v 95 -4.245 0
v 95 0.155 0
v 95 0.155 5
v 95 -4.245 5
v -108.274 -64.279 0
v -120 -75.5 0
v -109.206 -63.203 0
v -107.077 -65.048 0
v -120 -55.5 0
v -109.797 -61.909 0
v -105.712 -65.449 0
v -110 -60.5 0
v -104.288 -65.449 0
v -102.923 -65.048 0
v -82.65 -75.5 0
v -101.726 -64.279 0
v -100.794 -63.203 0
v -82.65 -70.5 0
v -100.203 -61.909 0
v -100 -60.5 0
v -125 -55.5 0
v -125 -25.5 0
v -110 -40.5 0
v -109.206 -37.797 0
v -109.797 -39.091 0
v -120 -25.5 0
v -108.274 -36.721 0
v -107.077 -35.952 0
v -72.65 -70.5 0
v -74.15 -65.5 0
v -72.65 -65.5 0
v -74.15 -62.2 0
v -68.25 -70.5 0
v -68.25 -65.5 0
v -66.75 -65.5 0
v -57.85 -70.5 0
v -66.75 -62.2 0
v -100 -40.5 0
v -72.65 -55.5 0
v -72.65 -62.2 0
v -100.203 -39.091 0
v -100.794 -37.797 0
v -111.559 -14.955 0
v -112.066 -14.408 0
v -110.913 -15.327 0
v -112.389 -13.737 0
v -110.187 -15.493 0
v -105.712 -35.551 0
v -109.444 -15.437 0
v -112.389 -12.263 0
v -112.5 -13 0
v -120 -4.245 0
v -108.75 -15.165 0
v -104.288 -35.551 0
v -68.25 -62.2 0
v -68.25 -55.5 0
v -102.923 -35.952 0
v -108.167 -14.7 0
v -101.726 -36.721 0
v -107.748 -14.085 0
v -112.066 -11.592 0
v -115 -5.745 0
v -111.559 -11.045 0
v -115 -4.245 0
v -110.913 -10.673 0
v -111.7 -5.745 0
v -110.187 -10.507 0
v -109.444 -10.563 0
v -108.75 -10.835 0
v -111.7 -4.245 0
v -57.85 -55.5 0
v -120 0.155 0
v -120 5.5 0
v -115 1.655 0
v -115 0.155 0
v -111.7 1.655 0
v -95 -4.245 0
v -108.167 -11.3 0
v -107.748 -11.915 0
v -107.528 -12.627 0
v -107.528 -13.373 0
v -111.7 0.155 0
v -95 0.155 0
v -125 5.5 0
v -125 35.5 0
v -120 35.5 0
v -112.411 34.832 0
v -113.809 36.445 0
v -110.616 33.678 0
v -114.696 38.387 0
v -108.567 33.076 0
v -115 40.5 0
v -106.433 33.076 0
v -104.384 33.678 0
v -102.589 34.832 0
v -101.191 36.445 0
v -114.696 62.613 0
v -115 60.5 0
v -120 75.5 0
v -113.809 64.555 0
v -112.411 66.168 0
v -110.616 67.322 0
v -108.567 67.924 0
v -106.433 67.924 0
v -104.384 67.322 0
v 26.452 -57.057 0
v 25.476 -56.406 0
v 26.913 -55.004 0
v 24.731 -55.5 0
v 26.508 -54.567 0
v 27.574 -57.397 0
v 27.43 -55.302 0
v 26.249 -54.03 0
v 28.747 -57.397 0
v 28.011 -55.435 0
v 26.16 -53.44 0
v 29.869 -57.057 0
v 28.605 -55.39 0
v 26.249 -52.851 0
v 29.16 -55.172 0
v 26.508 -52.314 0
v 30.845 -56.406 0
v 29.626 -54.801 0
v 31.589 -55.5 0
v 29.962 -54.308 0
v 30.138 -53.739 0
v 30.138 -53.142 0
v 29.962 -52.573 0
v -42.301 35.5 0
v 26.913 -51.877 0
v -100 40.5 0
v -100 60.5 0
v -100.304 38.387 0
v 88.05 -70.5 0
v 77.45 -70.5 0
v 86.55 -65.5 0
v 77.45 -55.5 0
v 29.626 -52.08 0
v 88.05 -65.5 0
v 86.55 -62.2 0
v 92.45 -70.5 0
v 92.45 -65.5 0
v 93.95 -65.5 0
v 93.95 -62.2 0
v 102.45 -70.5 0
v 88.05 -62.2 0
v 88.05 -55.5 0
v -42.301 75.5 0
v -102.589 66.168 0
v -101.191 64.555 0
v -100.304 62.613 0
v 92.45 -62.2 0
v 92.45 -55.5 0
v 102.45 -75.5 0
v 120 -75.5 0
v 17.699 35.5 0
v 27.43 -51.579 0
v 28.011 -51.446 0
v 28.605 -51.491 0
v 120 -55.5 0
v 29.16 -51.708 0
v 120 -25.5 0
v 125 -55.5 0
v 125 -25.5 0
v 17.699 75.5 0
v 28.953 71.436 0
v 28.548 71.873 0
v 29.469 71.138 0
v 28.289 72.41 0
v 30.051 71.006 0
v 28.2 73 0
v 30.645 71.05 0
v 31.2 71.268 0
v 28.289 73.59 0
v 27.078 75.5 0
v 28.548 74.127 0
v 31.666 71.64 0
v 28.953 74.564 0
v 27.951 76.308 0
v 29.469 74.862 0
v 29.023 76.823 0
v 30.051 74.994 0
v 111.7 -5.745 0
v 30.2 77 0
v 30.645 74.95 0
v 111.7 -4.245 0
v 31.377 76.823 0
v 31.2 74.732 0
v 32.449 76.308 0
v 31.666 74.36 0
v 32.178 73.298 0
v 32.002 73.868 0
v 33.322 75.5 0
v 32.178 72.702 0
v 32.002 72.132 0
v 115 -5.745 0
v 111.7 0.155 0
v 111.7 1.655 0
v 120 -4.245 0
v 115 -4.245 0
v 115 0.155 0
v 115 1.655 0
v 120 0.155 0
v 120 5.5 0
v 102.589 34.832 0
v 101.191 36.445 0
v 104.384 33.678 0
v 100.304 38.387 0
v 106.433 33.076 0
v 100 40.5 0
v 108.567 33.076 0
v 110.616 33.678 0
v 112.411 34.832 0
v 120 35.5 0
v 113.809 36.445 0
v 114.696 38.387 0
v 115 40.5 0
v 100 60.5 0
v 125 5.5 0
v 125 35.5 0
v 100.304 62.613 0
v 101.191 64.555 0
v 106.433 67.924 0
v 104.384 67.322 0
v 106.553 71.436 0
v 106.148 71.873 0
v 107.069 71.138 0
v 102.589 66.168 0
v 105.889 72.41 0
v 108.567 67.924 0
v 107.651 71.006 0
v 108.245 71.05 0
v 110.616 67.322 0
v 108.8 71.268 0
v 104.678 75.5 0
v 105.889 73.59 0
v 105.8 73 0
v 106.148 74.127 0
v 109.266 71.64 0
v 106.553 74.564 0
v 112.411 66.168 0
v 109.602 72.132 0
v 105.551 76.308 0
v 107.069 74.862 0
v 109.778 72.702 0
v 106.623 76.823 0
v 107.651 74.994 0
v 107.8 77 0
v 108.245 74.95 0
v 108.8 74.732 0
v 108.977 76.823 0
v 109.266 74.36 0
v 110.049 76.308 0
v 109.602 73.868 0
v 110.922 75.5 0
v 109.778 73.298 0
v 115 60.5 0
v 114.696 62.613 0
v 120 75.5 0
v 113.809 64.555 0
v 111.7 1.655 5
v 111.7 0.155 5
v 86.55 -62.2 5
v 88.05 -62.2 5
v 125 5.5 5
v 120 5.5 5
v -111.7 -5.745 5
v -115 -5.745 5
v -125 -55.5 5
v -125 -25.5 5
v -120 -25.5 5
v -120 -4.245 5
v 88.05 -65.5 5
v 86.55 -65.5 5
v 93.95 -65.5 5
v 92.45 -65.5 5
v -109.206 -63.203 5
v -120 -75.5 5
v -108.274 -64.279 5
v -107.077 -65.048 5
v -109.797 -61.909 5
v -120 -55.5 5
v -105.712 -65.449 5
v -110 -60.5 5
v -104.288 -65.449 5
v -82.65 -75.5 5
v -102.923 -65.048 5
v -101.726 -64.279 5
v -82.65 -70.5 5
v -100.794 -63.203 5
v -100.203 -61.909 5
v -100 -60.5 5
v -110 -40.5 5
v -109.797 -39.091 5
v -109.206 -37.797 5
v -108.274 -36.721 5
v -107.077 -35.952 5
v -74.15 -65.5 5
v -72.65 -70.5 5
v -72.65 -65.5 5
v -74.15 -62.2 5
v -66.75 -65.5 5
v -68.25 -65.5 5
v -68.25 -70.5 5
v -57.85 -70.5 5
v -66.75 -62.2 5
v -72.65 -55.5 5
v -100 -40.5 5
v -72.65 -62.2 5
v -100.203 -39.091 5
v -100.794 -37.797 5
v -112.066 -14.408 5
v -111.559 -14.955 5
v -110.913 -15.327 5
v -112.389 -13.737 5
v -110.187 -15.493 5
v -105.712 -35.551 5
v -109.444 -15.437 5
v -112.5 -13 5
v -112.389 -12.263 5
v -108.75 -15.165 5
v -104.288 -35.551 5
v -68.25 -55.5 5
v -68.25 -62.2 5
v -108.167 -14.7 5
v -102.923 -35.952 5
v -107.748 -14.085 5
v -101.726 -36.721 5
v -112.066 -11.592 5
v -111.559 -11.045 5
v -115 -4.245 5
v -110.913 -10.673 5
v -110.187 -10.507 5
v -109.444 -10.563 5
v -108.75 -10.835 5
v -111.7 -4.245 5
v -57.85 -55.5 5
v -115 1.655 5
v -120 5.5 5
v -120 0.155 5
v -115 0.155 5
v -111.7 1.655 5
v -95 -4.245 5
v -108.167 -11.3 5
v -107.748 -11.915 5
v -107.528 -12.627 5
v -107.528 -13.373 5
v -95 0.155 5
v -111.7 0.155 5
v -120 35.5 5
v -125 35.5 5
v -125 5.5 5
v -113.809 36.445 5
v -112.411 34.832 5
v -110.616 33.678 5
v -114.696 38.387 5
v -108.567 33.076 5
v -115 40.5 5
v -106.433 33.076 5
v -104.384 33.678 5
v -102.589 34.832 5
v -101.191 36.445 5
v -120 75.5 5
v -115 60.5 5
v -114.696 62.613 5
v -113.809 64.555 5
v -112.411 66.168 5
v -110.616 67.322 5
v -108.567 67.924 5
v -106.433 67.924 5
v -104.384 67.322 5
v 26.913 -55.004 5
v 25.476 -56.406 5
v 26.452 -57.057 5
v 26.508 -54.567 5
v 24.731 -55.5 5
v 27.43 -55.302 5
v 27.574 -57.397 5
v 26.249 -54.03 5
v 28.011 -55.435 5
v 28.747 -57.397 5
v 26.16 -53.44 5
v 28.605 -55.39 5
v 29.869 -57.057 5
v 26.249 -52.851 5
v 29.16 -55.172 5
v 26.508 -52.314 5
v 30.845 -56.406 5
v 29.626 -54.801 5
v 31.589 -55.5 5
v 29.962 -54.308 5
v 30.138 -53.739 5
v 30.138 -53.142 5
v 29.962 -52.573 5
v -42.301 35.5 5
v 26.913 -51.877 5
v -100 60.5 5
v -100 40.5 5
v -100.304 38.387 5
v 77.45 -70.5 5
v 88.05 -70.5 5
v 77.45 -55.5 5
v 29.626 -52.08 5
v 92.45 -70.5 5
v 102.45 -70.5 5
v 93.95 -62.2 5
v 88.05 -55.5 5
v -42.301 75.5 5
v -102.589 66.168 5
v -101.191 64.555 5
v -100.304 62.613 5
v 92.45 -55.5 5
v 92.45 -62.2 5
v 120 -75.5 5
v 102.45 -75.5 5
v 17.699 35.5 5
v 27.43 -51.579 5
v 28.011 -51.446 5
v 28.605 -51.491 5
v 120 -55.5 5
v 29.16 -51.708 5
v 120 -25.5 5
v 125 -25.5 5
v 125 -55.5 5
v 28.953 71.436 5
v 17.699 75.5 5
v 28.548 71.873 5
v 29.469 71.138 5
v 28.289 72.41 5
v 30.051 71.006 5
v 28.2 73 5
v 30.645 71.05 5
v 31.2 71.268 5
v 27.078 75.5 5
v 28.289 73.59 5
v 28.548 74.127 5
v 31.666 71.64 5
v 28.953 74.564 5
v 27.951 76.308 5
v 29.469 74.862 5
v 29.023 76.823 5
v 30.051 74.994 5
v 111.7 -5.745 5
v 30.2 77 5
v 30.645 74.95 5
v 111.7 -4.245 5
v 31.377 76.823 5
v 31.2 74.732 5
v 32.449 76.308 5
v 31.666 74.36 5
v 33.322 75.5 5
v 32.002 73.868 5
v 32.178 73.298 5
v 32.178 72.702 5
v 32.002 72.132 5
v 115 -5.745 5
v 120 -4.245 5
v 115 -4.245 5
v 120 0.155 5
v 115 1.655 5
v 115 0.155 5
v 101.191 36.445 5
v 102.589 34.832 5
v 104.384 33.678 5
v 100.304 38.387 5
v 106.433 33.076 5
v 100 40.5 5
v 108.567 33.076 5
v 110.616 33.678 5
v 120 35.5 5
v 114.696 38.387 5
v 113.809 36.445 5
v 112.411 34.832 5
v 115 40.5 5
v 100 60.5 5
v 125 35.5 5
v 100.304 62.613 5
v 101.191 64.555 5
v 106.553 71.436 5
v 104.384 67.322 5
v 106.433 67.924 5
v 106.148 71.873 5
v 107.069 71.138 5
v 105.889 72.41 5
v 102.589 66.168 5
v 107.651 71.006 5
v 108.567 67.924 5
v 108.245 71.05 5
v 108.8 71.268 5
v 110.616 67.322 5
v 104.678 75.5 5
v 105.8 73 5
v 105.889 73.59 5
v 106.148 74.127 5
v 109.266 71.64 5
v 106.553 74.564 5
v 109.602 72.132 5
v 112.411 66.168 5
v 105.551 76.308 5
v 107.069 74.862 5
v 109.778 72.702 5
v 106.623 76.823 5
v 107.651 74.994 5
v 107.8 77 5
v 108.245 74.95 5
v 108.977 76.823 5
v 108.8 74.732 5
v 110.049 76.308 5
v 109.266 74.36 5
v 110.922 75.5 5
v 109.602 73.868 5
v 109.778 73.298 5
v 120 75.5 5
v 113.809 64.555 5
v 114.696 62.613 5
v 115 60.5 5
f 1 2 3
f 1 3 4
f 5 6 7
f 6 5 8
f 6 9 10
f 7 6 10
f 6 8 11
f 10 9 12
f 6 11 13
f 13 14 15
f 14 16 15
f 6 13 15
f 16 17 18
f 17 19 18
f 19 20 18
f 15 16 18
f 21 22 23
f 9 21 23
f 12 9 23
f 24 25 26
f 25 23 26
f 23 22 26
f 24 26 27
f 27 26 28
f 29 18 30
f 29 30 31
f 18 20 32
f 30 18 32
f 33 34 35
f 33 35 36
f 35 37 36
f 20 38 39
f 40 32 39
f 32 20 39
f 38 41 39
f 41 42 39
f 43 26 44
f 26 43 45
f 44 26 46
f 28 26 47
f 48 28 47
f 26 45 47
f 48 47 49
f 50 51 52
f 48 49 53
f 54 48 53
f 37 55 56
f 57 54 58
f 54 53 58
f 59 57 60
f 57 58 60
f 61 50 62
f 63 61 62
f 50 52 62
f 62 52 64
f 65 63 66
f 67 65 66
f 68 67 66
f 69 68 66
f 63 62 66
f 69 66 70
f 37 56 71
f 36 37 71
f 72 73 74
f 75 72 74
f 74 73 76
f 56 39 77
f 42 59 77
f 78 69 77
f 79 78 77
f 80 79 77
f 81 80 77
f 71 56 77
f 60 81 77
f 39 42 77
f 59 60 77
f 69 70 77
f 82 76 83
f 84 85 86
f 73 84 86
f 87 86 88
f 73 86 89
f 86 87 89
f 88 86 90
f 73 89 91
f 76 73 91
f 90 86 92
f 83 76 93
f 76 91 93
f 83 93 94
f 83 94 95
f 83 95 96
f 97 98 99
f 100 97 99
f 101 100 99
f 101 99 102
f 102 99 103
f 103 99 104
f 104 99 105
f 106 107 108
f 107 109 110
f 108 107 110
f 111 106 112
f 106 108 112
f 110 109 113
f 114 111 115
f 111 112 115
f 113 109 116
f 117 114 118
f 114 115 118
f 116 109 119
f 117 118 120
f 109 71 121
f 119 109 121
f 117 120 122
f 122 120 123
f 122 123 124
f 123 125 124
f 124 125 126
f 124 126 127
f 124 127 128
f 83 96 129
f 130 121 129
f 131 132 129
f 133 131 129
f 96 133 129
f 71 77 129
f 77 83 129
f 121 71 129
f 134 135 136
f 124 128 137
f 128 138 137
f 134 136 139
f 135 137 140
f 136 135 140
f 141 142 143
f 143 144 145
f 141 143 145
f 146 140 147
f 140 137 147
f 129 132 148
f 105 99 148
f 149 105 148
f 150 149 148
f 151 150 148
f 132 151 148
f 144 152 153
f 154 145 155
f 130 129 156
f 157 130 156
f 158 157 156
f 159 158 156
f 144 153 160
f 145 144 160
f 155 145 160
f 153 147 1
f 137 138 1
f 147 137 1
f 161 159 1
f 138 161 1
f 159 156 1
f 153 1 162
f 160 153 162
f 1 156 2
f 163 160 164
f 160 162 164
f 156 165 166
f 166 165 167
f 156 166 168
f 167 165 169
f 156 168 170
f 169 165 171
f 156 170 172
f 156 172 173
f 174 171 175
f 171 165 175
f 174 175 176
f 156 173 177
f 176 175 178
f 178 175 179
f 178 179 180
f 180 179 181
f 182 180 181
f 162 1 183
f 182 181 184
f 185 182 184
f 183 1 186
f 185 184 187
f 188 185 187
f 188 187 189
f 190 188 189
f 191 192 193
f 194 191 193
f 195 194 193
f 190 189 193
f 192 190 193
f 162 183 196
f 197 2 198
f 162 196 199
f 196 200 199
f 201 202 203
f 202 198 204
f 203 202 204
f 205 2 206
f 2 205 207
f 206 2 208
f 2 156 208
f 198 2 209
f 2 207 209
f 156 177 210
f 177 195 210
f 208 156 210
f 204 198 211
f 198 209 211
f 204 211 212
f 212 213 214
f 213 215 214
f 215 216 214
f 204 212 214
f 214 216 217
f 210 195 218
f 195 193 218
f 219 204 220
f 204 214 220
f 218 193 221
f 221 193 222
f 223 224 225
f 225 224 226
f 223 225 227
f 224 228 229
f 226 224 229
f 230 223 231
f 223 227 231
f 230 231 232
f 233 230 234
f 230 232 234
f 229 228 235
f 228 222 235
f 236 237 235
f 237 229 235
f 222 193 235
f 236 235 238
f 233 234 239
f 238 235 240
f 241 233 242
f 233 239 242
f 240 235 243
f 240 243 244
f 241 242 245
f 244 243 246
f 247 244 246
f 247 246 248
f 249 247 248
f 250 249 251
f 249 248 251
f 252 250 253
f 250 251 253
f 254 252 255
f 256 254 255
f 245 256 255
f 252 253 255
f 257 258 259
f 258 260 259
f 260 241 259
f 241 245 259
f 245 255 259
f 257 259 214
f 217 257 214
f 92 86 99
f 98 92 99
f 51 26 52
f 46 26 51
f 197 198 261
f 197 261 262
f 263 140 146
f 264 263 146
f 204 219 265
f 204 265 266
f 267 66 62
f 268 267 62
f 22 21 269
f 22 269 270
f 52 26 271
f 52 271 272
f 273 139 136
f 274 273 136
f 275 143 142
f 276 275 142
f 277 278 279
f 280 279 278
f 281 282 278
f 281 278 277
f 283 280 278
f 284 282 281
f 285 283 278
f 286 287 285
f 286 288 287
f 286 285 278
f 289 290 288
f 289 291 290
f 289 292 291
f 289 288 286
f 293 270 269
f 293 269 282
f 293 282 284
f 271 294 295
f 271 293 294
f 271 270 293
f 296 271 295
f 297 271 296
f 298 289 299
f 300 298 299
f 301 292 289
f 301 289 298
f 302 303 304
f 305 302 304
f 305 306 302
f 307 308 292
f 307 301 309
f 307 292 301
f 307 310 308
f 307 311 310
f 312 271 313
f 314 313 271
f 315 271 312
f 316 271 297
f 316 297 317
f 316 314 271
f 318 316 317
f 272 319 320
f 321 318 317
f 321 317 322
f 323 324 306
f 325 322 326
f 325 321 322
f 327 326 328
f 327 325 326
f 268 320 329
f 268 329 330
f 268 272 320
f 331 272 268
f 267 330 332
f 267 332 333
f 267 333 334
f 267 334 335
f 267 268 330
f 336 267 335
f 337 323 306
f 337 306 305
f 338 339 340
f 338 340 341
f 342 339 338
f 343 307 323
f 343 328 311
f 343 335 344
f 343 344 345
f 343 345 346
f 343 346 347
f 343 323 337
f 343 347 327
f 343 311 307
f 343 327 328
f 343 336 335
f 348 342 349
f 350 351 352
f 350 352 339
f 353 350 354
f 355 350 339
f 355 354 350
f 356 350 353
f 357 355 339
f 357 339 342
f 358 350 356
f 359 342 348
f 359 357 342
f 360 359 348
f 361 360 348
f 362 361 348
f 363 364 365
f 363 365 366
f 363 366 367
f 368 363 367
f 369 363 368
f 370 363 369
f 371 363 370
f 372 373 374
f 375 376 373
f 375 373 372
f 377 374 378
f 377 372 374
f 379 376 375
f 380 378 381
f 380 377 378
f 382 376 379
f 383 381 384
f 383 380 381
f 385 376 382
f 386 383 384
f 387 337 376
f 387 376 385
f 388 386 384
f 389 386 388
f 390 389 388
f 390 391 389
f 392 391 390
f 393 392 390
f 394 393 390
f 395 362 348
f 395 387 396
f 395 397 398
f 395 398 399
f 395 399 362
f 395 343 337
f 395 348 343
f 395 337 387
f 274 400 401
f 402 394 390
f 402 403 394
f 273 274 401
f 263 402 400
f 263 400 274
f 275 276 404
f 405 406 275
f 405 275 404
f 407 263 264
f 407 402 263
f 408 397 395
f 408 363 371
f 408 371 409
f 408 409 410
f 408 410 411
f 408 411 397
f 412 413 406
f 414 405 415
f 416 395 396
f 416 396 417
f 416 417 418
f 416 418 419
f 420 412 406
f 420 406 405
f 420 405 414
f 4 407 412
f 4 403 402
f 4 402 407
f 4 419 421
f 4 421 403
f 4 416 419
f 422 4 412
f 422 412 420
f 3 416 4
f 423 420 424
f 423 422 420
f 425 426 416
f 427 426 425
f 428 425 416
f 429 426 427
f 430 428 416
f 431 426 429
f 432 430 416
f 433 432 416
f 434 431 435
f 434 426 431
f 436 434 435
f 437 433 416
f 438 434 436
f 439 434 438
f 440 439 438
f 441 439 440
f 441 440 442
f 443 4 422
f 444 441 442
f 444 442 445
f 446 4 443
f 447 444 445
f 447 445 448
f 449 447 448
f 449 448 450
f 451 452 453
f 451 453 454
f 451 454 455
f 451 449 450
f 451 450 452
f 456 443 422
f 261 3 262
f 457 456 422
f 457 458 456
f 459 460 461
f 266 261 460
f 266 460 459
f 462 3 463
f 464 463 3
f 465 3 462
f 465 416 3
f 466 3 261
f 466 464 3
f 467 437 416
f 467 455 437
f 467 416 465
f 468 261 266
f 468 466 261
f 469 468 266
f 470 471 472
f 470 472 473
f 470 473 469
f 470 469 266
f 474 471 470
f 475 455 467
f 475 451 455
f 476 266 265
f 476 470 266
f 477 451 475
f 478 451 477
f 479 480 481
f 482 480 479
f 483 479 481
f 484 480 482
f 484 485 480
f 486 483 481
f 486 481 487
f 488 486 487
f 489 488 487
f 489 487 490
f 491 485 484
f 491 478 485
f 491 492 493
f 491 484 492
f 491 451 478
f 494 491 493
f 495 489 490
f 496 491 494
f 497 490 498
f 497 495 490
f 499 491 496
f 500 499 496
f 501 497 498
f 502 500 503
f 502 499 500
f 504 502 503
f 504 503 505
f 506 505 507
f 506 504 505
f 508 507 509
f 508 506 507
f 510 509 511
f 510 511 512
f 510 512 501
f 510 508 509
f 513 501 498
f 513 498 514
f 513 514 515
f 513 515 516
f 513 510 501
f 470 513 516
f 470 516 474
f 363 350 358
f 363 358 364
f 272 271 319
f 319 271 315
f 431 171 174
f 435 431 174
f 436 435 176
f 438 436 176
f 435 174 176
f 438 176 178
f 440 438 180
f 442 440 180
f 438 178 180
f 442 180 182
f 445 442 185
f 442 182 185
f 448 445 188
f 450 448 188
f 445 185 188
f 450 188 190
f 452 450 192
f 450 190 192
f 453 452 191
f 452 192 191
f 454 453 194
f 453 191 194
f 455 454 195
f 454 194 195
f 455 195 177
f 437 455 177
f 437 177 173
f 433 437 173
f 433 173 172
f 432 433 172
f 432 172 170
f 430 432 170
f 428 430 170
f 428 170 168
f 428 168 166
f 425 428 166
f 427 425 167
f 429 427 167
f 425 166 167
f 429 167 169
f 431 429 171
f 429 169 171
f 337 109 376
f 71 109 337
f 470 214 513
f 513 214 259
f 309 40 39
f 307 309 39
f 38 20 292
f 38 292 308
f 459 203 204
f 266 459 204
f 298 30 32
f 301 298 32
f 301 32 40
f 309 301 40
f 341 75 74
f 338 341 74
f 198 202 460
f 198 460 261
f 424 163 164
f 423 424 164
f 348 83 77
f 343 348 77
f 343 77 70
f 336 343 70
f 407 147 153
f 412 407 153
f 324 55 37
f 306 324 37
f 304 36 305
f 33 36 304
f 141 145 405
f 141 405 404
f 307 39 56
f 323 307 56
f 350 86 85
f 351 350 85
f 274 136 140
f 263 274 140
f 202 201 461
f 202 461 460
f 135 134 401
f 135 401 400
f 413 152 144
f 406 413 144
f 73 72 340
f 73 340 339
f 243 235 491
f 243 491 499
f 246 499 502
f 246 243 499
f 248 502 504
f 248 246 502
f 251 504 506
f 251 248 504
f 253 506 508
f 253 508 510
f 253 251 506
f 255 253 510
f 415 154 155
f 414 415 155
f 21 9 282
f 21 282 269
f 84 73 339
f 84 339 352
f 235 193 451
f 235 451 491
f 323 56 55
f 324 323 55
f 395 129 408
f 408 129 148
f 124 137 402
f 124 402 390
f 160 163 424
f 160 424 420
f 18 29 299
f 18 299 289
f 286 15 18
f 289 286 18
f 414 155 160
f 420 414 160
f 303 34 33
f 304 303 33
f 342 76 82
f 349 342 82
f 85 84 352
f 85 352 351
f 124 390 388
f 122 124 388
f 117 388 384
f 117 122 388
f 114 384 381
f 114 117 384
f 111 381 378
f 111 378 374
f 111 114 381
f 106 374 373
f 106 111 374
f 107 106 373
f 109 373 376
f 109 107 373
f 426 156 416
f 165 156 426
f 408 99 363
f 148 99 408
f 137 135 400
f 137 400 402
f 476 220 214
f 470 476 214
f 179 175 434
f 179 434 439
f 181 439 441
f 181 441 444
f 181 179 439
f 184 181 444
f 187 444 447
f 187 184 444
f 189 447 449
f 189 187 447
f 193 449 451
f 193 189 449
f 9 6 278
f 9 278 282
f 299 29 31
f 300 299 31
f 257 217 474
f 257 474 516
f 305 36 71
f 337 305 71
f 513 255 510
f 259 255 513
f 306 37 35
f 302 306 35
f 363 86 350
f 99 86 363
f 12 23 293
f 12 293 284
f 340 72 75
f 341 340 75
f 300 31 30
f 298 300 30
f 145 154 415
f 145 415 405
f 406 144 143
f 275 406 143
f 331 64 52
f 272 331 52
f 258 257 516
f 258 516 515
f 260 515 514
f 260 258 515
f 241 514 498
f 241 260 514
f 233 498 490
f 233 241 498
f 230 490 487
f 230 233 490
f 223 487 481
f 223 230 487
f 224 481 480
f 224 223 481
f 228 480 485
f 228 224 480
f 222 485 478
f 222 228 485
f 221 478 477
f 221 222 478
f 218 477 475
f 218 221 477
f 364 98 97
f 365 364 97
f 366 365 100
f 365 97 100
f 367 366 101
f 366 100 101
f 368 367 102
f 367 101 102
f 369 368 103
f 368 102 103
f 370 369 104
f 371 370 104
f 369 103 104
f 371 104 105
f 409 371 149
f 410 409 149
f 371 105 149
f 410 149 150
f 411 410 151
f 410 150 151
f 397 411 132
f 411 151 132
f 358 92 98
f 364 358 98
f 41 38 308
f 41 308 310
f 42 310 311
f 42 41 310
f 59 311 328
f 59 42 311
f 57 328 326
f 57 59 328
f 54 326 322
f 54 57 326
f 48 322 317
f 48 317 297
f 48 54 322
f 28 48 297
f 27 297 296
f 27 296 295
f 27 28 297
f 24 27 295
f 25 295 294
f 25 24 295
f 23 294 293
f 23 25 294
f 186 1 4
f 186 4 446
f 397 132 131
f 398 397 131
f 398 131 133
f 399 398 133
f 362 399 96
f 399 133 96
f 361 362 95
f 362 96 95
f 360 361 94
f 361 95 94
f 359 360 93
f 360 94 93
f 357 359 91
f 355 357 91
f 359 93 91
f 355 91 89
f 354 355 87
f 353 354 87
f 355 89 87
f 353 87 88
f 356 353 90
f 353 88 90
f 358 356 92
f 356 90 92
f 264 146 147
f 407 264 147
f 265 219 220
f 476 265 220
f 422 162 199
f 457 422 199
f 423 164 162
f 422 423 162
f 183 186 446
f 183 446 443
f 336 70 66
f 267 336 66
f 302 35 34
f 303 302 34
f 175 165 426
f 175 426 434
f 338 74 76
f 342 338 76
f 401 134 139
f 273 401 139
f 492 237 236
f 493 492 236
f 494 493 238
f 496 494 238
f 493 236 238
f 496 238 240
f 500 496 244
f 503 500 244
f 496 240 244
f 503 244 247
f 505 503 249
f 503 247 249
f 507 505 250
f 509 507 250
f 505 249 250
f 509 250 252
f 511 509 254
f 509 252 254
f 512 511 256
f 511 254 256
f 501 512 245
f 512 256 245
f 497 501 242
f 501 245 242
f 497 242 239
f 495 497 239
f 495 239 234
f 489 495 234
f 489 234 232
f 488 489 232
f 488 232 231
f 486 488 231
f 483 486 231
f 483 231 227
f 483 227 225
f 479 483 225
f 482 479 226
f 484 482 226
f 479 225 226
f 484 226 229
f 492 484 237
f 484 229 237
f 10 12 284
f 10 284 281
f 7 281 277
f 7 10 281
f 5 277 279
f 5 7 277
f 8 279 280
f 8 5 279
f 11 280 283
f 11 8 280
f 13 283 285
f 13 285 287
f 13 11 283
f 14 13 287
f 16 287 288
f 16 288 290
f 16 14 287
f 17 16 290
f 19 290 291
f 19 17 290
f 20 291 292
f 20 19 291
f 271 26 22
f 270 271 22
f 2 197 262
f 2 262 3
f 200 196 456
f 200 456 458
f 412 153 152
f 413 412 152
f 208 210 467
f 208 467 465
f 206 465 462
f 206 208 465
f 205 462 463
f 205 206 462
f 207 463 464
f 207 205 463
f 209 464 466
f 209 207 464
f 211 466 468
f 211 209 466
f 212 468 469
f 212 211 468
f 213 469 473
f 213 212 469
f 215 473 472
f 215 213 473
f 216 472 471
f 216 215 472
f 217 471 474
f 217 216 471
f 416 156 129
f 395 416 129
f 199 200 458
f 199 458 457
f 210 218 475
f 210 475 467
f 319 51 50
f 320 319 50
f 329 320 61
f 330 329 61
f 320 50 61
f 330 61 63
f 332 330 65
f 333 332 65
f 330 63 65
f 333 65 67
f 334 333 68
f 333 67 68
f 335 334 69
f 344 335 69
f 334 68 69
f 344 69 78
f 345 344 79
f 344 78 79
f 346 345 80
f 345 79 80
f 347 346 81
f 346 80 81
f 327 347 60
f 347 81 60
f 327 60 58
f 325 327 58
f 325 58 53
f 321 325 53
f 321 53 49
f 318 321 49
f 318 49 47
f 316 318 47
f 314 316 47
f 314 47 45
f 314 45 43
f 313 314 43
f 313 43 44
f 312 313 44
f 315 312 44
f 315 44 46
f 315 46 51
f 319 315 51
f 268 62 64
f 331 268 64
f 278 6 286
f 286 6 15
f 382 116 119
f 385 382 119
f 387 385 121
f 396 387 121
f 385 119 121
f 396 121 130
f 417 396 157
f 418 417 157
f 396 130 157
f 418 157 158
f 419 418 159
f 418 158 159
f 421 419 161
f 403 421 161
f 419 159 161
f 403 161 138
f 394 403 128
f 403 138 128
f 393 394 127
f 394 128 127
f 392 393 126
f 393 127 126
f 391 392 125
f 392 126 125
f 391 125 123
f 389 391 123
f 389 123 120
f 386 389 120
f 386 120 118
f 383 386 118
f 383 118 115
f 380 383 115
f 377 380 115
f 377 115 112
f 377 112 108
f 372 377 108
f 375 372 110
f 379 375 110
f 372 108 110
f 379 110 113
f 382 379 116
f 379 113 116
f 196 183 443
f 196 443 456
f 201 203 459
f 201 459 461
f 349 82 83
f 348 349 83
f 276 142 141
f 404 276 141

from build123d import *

# Parameters (mm, degrees)
SKETCH1_W           = 240
SKETCH1_H           = 151
BOSS_EXTRUDE1_DEPTH = 5
SKETCH2_W           = 60
SKETCH2_H           = 40
CUT_EXTRUDE1_DEPTH  = 5
SKETCH4_R           = 2
CUT_EXTRUDE3_DEPTH  = 5
SKETCH5_R           = 4
SKETCH5_R_2         = 2
BOSS_EXTRUDE2_DEPTH = 5
CUT_EXTRUDE5_DEPTH  = 5
SKETCH12_R          = 2
CUT_EXTRUDE7_DEPTH  = 5
SKETCH13_R          = 2.5
CUT_EXTRUDE8_DEPTH  = 10
SKETCH16_W          = 5
SKETCH16_H          = 30
BOSS_EXTRUDE5_DEPTH = 5
CUT_EXTRUDE11_DEPTH = 5
SKETCH18_W          = 135.3
SKETCH18_H          = 20
CUT_EXTRUDE13_DEPTH = 10
SKETCH19_R          = 4
SKETCH19_R_2        = 2
BOSS_EXTRUDE6_DEPTH = 5
SKETCH20_W          = 24.8
SKETCH20_H          = 5
CUT_EXTRUDE14_DEPTH = 5
SKETCH21_W          = 25
SKETCH21_H          = 5
CUT_EXTRUDE15_DEPTH = 5
CUT_EXTRUDE16_DEPTH = 5
CUT_EXTRUDE17_DEPTH = 10


with BuildPart() as part:
    # Sketch1 → Boss-Extrude1 (new body)
    with BuildSketch(Plane.XY):
        Rectangle(SKETCH1_W, SKETCH1_H)
    extrude(amount=BOSS_EXTRUDE1_DEPTH)

    # Sketch2 → Cut-Extrude1 (cut)
    with BuildSketch(Plane(origin=(0, 0, 0), x_dir=(-1, 0, 0), z_dir=(0, 0, -1))):
        with Locations((12.301489704, 55.5)):
            Rectangle(SKETCH2_W, SKETCH2_H)
    extrude(amount=-CUT_EXTRUDE1_DEPTH, mode=Mode.SUBTRACT)

    # Sketch4 → Cut-Extrude3 (cut)
    with BuildSketch(Plane(origin=(0, 0, 0), x_dir=(-1, 0, 0), z_dir=(0, 0, -1))):
        with Locations((-107.8, 73)):
            Circle(SKETCH4_R)
        with Locations((-30.2, 73)):
            Circle(SKETCH4_R)
    extrude(amount=-CUT_EXTRUDE3_DEPTH, mode=Mode.SUBTRACT)

    # Sketch5 → Boss-Extrude2 (add)
    with BuildSketch(Plane(origin=(0, 0, 0), x_dir=(-1, 0, 0), z_dir=(0, 0, -1))):
        with Locations((-30.2, 73)):
            Circle(SKETCH5_R)
        with Locations((-30.2, 73)):
            Circle(SKETCH5_R_2, mode=Mode.SUBTRACT)
        with Locations((-107.8, 73)):
            Circle(SKETCH5_R)
        with Locations((-107.8, 73)):
            Circle(SKETCH5_R_2, mode=Mode.SUBTRACT)
    extrude(amount=-BOSS_EXTRUDE2_DEPTH)

    # Sketch8 → Cut-Extrude5 (cut)
    with BuildSketch(Plane(origin=(0, 0, 0), x_dir=(-1, 0, 0), z_dir=(0, 0, -1))):
        with BuildLine():
            Line((100, -60.5), (100, -40.5))
            ThreePointArc((100, -40.5), (105, -35.5), (110, -40.5))
            Line((110, -40.5), (110, -60.5))
            ThreePointArc((110, -60.5), (105, -65.5), (100, -60.5))
        make_face()
    extrude(amount=-CUT_EXTRUDE5_DEPTH, mode=Mode.SUBTRACT)

    # Sketch12 → Cut-Extrude7 (cut)
    with BuildSketch(Plane(origin=(0, 0, 0), x_dir=(-1, 0, 0), z_dir=(0, 0, -1))):
        with Locations((-28.16035742, -53.440416767)):
            Circle(SKETCH12_R)
    extrude(amount=-CUT_EXTRUDE7_DEPTH, mode=Mode.SUBTRACT)

    # Sketch13 → Cut-Extrude8 (cut)
    with BuildSketch(Plane(origin=(0, 0, 0), x_dir=(-1, 0, 0), z_dir=(0, 0, -1))):
        with Locations((110, -13)):
            Circle(SKETCH13_R)
    extrude(amount=-CUT_EXTRUDE8_DEPTH, mode=Mode.SUBTRACT)

    # Sketch16 → Boss-Extrude5 (add)
    with BuildSketch(Plane(origin=(0, 0, 0), x_dir=(-1, 0, 0), z_dir=(0, 0, -1))):
        with Locations((-122.5, 20.5)):
            Rectangle(SKETCH16_W, SKETCH16_H)
        with Locations((-122.5, -40.5)):
            Rectangle(SKETCH16_W, SKETCH16_H)
        with Locations((122.5, -40.5)):
            Rectangle(SKETCH16_W, SKETCH16_H)
        with Locations((122.5, 20.5)):
            Rectangle(SKETCH16_W, SKETCH16_H)
    extrude(amount=-BOSS_EXTRUDE5_DEPTH)

    # Sketch17 → Cut-Extrude11 (cut)
    with BuildSketch(Plane(origin=(0, 0, 0), x_dir=(-1, 0, 0), z_dir=(0, 0, -1))):
        Polygon((-120, 0.154989229), (-115, 0.154989229), (-115, 1.654989229), (-111.7, 1.654989229), (-111.7, 0.154989229), (-95, 0.154989229), (-95, -4.245010771), (-111.7, -4.245010771), (-111.7, -5.745010771), (-115, -5.745010771), (-115, -4.245010771), (-120, -4.245010771), align=None)
        Polygon((120, -4.245010771), (120, 0.154989229), (115, 0.154989229), (115, 1.654989229), (111.7, 1.654989229), (111.7, 0.154989229), (95, 0.154989229), (95, -4.245010771), (111.7, -4.245010771), (111.7, -5.745010771), (115, -5.745010771), (115, -4.245010771), align=None)
    extrude(amount=-CUT_EXTRUDE11_DEPTH, mode=Mode.SUBTRACT)

    # Sketch18 → Cut-Extrude13 (cut)
    with BuildSketch(Plane(origin=(0, 0, 0), x_dir=(-1, 0, 0), z_dir=(0, 0, -1))):
        with Locations((-9.8, -65.5)):
            Rectangle(SKETCH18_W, SKETCH18_H)
    extrude(amount=-CUT_EXTRUDE13_DEPTH, mode=Mode.SUBTRACT)

    # Sketch19 → Boss-Extrude6 (add)
    with BuildSketch(Plane(origin=(0, 0, 0), x_dir=(-1, 0, 0), z_dir=(0, 0, -1))):
        with Locations((-28.16035742, -53.440416767)):
            Circle(SKETCH19_R)
        with Locations((-28.16035742, -53.440416767)):
            Circle(SKETCH19_R_2, mode=Mode.SUBTRACT)
    extrude(amount=-BOSS_EXTRUDE6_DEPTH)

    # Sketch20 → Cut-Extrude14 (cut)
    with BuildSketch(Plane(origin=(0, 0, 0), x_dir=(-1, 0, 0), z_dir=(0, 0, -1))):
        with Locations((70.25, -73)):
            Rectangle(SKETCH20_W, SKETCH20_H)
    extrude(amount=-CUT_EXTRUDE14_DEPTH, mode=Mode.SUBTRACT)

    # Sketch21 → Cut-Extrude15 (cut)
    with BuildSketch(Plane(origin=(0, 0, 0), x_dir=(-1, 0, 0), z_dir=(0, 0, -1))):
        with Locations((-89.95, -73)):
            Rectangle(SKETCH21_W, SKETCH21_H)
    extrude(amount=-CUT_EXTRUDE15_DEPTH, mode=Mode.SUBTRACT)

    # Sketch22 → Cut-Extrude16 (cut)
    with BuildSketch(Plane(origin=(0, 0, 0), x_dir=(-1, 0, 0), z_dir=(0, 0, -1))):
        Polygon((68.25, -55.5), (68.25, -62.2), (66.75, -62.2), (66.75, -65.5), (68.25, -65.5), (68.25, -70.5), (72.65, -70.5), (72.65, -65.5), (74.15, -65.5), (74.15, -62.2), (72.65, -62.2), (72.65, -55.5), align=None)
        Polygon((-92.45, -55.5), (-92.45, -62.2), (-93.95, -62.2), (-93.95, -65.5), (-92.45, -65.5), (-92.45, -70.5), (-88.05, -70.5), (-88.05, -65.5), (-86.55, -65.5), (-86.55, -62.2), (-88.05, -62.2), (-88.05, -55.5), align=None)
    extrude(amount=-CUT_EXTRUDE16_DEPTH, mode=Mode.SUBTRACT)

    # Sketch23 → Cut-Extrude17 (cut)
    with BuildSketch(Plane(origin=(0, 0, 0), x_dir=(-1, 0, 0), z_dir=(0, 0, -1))):
        with BuildLine():
            Line((-100, 60.5), (-100, 40.5))
            ThreePointArc((-100, 40.5), (-107.5, 33), (-115, 40.5))
            Line((-115, 40.5), (-115, 60.5))
            ThreePointArc((-115, 60.5), (-107.5, 68), (-100, 60.5))
        make_face()
        with BuildLine():
            Line((100, 60.5), (100, 40.5))
            ThreePointArc((100, 40.5), (107.5, 33), (115, 40.5))
            Line((115, 40.5), (115, 60.5))
            ThreePointArc((115, 60.5), (107.5, 68), (100, 60.5))
        make_face()
    extrude(amount=-CUT_EXTRUDE17_DEPTH, mode=Mode.SUBTRACT)


solid = part.part
